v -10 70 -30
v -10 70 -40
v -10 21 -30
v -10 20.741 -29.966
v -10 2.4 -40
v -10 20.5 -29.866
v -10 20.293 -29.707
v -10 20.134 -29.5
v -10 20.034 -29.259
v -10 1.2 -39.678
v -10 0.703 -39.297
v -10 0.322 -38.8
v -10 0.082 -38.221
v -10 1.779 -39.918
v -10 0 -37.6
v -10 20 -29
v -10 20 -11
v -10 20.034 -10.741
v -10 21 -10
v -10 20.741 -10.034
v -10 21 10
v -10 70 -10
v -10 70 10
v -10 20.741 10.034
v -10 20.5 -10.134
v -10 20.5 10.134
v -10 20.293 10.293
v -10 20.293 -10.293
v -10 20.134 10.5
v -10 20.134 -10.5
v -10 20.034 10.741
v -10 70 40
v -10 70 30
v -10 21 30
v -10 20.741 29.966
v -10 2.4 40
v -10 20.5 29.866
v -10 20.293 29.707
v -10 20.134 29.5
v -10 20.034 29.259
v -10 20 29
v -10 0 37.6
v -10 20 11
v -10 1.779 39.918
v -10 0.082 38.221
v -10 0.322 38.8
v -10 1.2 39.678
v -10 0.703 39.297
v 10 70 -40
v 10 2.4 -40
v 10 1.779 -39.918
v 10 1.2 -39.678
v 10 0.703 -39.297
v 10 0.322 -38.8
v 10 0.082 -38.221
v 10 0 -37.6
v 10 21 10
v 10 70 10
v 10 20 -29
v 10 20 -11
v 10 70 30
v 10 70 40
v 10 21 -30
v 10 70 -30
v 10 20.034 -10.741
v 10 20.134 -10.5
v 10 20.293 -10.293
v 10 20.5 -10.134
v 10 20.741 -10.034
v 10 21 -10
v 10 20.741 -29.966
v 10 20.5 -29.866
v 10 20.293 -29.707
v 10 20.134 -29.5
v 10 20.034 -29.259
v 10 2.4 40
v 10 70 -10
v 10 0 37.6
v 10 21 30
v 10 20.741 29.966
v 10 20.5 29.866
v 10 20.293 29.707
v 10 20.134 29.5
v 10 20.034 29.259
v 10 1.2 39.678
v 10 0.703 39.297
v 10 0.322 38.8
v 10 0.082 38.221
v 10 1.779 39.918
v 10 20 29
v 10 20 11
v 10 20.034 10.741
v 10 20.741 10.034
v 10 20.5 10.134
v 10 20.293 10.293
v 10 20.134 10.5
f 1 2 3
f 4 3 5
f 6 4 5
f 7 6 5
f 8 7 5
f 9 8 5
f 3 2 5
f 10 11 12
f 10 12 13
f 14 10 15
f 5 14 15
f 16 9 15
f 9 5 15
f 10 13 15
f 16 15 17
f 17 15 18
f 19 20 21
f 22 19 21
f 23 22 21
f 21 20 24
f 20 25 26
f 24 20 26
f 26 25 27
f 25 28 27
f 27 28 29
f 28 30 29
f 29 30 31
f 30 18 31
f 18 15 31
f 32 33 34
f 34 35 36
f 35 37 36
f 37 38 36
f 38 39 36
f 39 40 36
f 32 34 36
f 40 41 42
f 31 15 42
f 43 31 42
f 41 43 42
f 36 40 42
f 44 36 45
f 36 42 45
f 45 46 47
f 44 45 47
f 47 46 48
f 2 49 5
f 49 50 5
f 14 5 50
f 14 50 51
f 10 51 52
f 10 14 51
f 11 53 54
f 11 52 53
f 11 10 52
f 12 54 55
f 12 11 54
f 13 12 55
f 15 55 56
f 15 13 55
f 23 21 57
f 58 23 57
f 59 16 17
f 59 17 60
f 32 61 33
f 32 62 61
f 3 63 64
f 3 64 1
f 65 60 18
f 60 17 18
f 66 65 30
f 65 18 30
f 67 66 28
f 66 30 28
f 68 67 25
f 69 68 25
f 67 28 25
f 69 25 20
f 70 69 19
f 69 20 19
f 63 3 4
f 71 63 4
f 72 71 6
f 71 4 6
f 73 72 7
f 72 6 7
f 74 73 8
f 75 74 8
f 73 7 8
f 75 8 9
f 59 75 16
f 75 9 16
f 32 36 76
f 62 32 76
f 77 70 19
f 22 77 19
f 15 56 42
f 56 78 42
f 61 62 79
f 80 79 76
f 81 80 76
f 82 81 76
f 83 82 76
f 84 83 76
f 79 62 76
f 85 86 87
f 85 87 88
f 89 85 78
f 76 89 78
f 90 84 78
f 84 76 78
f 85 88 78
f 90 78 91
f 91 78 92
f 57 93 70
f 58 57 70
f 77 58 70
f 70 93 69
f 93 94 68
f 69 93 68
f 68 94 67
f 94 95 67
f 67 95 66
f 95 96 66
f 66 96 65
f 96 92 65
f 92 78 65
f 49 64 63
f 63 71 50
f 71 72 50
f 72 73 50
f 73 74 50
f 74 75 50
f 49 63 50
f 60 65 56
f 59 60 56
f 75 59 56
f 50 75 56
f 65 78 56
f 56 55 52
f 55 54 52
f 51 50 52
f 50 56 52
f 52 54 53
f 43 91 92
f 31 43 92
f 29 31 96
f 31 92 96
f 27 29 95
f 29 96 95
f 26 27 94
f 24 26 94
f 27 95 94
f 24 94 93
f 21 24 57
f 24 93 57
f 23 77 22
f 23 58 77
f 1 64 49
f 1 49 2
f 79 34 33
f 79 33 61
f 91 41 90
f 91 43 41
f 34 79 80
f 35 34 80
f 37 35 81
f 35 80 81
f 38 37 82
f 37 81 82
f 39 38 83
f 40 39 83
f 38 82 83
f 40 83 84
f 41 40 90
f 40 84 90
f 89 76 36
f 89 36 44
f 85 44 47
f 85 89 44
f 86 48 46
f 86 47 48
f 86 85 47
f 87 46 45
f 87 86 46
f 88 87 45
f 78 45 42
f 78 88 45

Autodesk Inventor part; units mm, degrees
ref_plane "YZ Plane" through (0, 0, 0) normal (1, 0, 0) x (0, 1, 0)
ref_plane "XZ Plane" through (0, 0, 0) normal (0, 1, 0) x (-1, 0, 0)
ref_plane "XY Plane" through (0, 0, 0) normal (0, 0, 1) x (1, 0, 0)
sketch "Sketch1" plane through (0, 0, 0) normal (0, 1, 0) x (-1, 0, 0)
  line L0 (10, 40) -> (-10, 40)
  line L1 (-10, 40) -> (-10, -40)
  line L2 (-10, -40) -> (10, -40)
  line L3 (10, -40) -> (10, 40)
  point P0 (0, 0)
  point P1 (10, 0)
  point P2 (0, -40)
  dimension "d0" = 80
  dimension "d1" = 20
extrude "MainCore" add sketch "Sketch1" along normal blind 70
sketch "Sketch3" plane through (0, 70, 0) normal (0, 1, 0) x (1, 0, 0)
  line L0 (-10, -10) -> (10, -10)
  line L1 (10, -10) -> (10, 10)
  line L2 (10, 10) -> (-10, 10)
  line L3 (-10, 10) -> (-10, -10)
  line L4 (-10, 40) -> (-10, -40) projected
  line L5 (-10, -30) -> (10, -30)
  line L6 (10, -30) -> (10, -10)
  line L7 (10, -10) -> (-10, -10)
  line L8 (-10, -10) -> (-10, -30)
  line L9 (-10, 10) -> (10, 10)
  line L10 (10, 10) -> (10, 30)
  line L11 (10, 30) -> (-10, 30)
  line L12 (-10, 30) -> (-10, 10)
  point P0 (0, 0)
  point P1 (-10, 0)
  point P2 (0, 10)
  point P3 (0, -10)
  point P4 (0, 10)
  dimension "d4" = 20
  dimension "d5" = 20
  dimension "d6" = 20
extrude "Windows" cut sketch "Sketch3" against normal blind 50 contours L0 L6 L5 L4 | L4 L11 L10 L2
fillet "Outer corners" radius 2.4 2 edges at (0, 0, -40) (0, 0, 40)
fillet "Fillet2" radius 1 4 edges at (0, 20, 10) (0, 20, 30) (0, 20, -10) (0, 20, -30)
equation "\"d0\" = coreWidth"
equation "\"d1\" = coreDepth"
equation "\"d4\" = coreLegWidthInner"
equation "\"d5\" = -0.5 * coreLegWidthInner + 0.5 * coreWidthInner"
equation "\"d6\" = -0.5 * coreLegWidthInner + 0.5 * coreWidthInner"
equation "\"d9\" = 0.03 * coreWidth"
equation "\"d10\" = 0.025 * coreWidthInner - 0.025 * coreLegWidthInner"
equation "\"coreWidth\" = 80"
equation "\"coreDepth\" = 20"
equation "\"coreLegWidthInner\" = 20"
equation "\"wallThick\" = 1"
equation "\"extDepth\" = 31.8"
equation "\"WireDia\" = 1.2"
equation "\"Airgap\" = 0.24"
equation "\"coreWidthInner\" = 60"
properties part number "coil 55_28_21-02"
